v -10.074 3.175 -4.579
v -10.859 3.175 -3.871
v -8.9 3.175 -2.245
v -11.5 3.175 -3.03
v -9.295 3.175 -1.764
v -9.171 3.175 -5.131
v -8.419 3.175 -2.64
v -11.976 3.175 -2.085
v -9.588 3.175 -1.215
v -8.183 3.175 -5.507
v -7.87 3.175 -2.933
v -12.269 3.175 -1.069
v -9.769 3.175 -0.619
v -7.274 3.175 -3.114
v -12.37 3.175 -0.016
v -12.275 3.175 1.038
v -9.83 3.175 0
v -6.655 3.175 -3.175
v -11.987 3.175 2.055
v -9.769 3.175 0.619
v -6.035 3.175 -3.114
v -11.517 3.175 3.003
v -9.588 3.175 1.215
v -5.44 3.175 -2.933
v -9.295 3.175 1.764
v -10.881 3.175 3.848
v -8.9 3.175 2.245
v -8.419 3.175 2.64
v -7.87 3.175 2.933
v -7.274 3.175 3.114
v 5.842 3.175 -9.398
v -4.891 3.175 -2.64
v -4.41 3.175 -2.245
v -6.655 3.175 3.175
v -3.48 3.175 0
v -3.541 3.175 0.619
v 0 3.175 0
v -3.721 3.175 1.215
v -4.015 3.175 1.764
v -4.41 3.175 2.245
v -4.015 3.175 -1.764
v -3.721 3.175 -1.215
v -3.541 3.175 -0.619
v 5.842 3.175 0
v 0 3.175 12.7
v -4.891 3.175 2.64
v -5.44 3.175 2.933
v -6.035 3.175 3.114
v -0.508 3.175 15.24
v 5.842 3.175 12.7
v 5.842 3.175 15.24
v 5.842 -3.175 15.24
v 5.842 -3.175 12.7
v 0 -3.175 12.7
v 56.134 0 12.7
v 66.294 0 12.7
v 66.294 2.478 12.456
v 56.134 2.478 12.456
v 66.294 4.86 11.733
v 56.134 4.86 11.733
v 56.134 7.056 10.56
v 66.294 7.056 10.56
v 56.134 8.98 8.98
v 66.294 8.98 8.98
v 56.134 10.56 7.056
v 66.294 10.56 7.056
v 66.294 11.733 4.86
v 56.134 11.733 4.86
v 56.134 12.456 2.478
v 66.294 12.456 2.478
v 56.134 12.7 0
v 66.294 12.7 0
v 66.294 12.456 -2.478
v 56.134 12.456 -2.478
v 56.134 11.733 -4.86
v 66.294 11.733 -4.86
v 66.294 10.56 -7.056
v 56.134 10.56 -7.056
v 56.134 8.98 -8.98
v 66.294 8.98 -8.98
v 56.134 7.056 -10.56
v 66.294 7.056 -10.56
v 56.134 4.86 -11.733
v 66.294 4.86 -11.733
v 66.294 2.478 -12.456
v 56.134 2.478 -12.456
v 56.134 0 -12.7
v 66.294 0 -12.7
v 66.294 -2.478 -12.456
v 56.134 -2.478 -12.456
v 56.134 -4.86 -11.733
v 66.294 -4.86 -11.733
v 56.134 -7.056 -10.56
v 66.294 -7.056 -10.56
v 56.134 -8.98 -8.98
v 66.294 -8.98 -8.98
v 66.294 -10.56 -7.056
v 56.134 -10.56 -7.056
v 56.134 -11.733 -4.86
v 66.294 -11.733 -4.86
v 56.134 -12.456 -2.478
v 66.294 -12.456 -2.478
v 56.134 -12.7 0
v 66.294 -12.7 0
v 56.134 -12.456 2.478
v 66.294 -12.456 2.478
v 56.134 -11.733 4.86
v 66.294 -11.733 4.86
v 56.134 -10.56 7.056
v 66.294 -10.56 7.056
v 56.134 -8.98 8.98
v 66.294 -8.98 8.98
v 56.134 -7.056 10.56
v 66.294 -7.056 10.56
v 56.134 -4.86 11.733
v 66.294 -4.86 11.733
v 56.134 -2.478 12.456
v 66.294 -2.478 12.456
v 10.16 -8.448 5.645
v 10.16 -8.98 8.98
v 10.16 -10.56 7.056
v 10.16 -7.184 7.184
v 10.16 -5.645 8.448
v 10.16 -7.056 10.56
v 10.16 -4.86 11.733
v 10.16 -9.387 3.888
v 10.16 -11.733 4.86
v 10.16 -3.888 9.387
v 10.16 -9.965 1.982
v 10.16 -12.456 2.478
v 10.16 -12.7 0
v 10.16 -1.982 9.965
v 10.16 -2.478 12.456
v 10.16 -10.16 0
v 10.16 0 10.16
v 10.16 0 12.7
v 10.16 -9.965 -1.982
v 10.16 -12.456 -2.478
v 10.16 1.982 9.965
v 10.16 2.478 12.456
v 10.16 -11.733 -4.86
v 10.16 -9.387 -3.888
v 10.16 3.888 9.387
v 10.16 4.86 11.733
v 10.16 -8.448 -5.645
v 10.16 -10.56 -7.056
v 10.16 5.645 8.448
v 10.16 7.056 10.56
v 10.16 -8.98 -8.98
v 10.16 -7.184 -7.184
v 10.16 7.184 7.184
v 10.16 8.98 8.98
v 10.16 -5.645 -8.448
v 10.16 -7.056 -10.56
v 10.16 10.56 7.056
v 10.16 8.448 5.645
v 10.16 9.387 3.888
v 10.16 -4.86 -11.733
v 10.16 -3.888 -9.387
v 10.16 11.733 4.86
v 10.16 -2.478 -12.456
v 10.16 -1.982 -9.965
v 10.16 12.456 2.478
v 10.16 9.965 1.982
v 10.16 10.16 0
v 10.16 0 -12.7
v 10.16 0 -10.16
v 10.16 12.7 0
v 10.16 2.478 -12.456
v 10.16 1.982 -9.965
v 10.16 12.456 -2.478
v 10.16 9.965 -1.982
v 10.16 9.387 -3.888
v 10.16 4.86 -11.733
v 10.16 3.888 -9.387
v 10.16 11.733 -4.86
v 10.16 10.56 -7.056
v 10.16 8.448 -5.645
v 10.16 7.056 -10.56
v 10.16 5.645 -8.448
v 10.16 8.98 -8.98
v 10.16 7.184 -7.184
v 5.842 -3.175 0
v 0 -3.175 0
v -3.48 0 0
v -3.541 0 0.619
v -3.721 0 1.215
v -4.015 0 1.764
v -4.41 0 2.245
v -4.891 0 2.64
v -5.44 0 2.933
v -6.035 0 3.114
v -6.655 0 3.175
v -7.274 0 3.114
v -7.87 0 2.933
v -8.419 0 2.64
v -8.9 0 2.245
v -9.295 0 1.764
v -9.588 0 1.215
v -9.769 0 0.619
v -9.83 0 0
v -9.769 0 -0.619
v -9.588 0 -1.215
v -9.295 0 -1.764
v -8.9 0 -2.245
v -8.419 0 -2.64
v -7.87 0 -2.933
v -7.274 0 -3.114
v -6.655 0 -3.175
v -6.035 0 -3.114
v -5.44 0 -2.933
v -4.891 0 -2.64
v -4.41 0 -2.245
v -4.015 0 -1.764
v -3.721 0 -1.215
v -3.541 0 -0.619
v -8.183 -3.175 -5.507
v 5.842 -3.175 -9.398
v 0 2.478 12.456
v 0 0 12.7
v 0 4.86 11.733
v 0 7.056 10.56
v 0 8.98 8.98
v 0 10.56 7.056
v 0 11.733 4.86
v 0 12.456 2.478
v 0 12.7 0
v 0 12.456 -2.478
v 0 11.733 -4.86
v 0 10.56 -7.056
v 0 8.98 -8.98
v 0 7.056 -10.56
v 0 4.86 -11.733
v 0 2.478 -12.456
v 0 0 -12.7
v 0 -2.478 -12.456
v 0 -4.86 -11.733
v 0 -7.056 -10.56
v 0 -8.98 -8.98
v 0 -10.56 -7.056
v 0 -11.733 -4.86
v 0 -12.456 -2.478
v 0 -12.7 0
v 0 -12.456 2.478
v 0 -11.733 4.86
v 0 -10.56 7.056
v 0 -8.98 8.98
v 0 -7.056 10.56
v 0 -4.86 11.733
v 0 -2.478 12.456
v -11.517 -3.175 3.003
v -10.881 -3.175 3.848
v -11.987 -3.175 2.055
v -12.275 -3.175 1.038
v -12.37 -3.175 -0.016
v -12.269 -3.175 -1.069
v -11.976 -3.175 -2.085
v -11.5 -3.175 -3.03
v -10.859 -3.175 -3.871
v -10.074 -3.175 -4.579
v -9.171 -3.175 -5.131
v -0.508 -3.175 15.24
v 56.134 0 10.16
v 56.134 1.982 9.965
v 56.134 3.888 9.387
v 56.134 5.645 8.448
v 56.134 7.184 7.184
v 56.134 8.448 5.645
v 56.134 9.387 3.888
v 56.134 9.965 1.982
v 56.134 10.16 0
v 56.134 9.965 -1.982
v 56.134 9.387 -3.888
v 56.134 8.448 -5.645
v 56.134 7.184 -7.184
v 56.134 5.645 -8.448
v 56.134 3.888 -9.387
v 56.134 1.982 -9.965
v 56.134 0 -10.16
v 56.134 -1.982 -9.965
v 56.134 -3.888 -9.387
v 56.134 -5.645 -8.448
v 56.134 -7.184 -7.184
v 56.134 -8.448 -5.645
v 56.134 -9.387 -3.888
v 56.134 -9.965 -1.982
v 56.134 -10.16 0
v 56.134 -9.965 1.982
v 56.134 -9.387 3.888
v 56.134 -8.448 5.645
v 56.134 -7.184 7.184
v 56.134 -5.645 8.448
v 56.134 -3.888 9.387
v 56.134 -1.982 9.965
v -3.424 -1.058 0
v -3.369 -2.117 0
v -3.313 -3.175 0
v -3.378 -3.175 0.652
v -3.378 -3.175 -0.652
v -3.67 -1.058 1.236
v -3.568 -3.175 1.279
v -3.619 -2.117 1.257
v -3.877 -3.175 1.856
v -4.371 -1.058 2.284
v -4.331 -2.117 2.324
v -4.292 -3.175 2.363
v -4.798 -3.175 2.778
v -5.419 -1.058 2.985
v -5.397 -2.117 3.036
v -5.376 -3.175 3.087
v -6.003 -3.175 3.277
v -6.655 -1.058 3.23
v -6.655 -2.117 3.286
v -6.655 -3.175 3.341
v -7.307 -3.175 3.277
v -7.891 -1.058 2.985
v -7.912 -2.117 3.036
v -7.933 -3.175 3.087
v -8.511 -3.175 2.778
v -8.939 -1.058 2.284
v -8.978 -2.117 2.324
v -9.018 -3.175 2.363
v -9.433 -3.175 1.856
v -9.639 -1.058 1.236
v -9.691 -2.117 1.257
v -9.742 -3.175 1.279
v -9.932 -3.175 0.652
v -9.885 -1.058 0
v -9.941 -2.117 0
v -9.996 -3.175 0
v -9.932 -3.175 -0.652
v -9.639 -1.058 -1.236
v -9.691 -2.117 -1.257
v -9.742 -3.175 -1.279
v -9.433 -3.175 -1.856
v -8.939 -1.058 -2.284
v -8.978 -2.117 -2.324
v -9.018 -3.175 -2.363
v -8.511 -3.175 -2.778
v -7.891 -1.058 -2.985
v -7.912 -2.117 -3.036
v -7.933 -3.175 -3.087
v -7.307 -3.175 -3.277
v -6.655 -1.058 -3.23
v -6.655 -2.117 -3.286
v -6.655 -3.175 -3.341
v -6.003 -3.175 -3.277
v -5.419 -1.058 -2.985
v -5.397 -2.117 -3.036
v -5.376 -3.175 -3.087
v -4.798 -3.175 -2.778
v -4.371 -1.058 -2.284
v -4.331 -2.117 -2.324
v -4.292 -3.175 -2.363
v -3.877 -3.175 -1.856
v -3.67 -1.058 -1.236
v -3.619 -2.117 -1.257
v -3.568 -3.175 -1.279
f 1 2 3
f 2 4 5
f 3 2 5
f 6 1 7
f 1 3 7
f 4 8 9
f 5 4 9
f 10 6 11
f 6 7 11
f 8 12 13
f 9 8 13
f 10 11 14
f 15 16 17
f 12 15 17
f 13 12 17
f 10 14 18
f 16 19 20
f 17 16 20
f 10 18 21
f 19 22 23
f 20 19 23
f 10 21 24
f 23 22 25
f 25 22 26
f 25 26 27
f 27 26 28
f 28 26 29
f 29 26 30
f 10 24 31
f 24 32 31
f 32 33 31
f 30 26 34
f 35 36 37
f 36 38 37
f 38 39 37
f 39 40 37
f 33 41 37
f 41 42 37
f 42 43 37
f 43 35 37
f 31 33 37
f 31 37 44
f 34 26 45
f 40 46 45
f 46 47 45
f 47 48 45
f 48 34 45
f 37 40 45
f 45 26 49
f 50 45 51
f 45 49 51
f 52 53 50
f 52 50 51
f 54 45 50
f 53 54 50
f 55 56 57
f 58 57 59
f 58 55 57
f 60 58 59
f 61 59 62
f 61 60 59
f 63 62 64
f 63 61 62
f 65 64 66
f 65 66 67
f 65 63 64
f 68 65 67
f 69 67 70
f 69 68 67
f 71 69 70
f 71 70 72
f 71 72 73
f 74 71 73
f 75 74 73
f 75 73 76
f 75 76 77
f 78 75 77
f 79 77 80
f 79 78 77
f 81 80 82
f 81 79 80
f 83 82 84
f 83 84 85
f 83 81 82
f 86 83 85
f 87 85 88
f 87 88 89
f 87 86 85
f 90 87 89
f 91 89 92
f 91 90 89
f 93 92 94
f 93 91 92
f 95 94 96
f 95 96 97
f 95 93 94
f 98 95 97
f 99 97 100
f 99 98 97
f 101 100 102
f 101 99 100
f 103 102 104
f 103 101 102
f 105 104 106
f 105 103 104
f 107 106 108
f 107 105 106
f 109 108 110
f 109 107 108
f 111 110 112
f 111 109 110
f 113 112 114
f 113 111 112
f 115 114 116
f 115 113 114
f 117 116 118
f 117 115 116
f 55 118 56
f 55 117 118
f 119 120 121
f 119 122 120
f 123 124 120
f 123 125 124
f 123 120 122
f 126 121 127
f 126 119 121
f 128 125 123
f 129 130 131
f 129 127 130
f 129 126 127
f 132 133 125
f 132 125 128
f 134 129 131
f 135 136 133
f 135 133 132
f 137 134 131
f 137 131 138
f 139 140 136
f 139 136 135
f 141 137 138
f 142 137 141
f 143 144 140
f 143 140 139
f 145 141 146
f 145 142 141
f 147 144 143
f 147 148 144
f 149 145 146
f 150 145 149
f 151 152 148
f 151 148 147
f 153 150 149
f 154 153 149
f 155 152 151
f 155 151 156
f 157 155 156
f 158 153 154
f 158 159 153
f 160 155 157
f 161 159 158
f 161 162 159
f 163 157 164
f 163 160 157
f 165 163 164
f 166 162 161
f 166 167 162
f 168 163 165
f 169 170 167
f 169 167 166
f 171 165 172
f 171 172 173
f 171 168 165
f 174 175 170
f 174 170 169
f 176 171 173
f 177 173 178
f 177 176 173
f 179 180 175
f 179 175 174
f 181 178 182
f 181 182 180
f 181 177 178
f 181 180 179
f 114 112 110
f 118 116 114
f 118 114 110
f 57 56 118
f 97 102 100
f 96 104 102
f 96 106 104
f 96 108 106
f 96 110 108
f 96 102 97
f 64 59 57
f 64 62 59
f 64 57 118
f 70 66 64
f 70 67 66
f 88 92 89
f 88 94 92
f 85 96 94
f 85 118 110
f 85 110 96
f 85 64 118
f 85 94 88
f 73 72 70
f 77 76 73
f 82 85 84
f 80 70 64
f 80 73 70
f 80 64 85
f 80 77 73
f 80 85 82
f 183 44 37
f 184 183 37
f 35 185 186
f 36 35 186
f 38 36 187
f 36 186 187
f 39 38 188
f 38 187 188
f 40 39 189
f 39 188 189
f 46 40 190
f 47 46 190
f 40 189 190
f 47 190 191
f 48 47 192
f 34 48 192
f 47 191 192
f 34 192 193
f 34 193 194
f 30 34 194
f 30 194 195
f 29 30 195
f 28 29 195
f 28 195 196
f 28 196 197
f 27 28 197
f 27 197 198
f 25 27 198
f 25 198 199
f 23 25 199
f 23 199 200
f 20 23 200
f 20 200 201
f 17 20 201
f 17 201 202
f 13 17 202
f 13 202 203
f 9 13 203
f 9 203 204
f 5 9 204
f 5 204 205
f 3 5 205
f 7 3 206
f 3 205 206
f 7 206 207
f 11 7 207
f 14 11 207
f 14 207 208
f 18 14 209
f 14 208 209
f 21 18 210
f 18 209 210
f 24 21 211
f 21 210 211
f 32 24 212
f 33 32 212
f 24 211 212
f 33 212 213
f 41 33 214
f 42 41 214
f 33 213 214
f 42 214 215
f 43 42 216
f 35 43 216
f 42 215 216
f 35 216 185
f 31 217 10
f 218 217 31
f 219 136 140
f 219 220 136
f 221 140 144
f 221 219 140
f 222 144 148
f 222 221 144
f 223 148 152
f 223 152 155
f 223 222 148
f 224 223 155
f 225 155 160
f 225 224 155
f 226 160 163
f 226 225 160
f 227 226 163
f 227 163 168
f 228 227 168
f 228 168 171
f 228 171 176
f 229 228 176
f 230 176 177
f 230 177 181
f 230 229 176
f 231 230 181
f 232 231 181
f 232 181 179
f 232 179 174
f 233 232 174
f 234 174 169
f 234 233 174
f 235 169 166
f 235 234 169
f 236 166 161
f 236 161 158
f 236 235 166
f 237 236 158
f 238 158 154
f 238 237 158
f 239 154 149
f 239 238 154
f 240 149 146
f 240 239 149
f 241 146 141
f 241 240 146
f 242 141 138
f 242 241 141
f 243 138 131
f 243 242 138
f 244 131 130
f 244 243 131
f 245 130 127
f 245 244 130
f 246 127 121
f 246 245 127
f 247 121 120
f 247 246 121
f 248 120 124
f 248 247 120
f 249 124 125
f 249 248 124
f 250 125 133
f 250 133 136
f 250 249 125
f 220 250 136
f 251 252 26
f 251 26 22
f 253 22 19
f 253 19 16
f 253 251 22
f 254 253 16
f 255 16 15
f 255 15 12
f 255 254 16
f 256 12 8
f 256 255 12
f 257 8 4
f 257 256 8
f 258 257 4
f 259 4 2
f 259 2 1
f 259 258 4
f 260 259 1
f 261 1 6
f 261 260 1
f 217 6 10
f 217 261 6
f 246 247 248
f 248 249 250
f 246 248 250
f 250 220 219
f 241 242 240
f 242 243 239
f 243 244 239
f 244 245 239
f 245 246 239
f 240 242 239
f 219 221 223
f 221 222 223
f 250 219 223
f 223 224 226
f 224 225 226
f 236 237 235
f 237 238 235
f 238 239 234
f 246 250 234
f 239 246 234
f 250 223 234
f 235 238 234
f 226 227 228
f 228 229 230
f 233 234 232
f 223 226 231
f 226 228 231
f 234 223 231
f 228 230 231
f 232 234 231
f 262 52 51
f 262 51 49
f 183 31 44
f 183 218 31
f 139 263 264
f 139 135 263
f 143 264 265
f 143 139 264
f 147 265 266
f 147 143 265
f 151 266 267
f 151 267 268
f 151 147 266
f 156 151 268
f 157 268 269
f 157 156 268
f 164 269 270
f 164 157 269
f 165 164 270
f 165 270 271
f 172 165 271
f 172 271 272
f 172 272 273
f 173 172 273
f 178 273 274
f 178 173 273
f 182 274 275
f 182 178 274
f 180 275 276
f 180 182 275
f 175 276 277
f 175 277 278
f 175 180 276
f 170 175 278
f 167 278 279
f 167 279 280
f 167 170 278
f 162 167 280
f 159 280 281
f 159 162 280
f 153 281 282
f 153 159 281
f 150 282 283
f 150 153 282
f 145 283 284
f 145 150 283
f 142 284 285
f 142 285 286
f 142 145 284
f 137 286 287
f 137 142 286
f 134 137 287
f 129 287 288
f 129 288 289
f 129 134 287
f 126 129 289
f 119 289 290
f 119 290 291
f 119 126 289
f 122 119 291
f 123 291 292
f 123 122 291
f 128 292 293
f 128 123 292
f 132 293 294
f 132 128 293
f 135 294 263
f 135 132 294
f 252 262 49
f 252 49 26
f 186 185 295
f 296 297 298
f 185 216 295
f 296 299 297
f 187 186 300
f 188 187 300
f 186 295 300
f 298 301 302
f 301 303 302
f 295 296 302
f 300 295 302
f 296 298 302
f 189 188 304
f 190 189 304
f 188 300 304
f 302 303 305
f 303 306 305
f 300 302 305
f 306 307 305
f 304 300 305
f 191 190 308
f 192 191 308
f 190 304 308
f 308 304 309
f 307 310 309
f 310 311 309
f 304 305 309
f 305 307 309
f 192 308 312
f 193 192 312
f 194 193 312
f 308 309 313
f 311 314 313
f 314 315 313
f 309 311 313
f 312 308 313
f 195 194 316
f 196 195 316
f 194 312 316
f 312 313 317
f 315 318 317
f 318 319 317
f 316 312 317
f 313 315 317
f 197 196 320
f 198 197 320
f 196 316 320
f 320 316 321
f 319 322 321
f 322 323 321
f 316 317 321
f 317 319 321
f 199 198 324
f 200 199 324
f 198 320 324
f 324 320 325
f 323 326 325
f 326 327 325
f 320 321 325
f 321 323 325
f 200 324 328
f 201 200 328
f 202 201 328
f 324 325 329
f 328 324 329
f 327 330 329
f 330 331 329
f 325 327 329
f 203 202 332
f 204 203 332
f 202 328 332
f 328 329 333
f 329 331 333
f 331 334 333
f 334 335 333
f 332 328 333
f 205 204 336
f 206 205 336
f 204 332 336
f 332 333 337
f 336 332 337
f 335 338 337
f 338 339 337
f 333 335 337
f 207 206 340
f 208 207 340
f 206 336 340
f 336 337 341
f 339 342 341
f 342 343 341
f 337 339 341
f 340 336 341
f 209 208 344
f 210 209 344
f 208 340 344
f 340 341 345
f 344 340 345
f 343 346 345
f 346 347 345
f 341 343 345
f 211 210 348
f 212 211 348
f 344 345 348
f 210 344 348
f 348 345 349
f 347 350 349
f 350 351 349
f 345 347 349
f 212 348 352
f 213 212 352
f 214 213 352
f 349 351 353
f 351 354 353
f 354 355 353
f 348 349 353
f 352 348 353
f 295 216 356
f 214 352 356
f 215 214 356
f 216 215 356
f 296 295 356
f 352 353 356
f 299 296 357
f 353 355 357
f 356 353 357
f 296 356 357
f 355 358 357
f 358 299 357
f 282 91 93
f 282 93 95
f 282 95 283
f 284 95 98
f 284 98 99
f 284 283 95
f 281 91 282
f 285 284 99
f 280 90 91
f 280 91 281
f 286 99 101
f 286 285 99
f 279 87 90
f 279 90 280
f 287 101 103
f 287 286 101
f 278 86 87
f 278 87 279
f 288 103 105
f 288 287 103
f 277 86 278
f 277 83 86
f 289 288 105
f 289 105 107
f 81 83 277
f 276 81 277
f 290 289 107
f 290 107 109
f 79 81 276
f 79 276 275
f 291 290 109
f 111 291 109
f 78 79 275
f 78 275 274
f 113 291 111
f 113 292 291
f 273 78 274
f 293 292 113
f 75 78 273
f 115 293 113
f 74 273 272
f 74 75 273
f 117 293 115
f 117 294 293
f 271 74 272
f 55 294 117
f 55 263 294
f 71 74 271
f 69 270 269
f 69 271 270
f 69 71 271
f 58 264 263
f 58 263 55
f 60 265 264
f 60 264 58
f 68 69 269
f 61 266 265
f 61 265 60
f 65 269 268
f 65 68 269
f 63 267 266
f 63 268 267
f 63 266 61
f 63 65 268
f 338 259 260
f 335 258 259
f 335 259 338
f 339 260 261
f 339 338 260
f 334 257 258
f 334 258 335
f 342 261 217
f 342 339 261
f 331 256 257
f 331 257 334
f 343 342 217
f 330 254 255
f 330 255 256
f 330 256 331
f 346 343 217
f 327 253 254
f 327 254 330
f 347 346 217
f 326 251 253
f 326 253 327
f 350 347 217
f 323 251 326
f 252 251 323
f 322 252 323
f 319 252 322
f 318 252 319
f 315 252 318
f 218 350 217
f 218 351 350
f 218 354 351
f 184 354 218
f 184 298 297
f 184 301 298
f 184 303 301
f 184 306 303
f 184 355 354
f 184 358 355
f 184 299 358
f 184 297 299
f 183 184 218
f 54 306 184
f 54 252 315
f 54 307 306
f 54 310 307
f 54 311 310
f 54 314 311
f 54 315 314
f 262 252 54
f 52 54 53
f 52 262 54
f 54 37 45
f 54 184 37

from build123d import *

# Parameters (mm, degrees)
F0_R          = 3.175
F1_DEPTH      = 3.175
F1_DEPTH_BACK = 3.175
F2_DEPTH      = 3.176
F2_TAPER      = -3
F2_DEPTH_BACK = 3.176
F0_W          = 5.842
F0_H          = 12.7


with BuildPart() as f1:
    # F0 (on Front) → F1 (new body, two sides)
    with BuildSketch(Plane.XZ) as f1_sk:
        with BuildLine():
            Line((-0.9398, 0), (0, 0))
            Line((0, 0), (0, 12.7))
            Line((0, 12.7), (5.842, 12.7))
            Line((5.842, 12.7), (5.842, 15.24))
            Line((5.842, 15.24), (-0.508, 15.24))
            Line((-0.508, 15.24), (-10.8806298187, 3.8475430269))
            ThreePointArc((-10.8806298187, 3.8475430269), (-4.5919612295, 5.3297205562), (-0.9398, 0))
        make_face()
        with BuildLine():
            Line((5.842, 0), (0, 0))
            Line((0, 0), (-0.9398, 0))
            ThreePointArc((-0.9398, 0), (-3.1957909266, -4.5493385486), (-8.1826630726, -5.5069827884))
            Line((-8.1826630726, -5.5069827884), (5.842, -9.398))
            Line((5.842, -9.398), (5.842, 0))
        make_face()
        with BuildLine():
            ThreePointArc((-8.1826630726, -5.5069827884), (-3.1957909266, -4.5493385486), (-0.9398, 0))
            ThreePointArc((-0.9398, 0), (-4.5919612295, 5.3297205562), (-10.8806298187, 3.8475430269))
            ThreePointArc((-10.8806298187, 3.8475430269), (-12.1459778134, -1.5837270034), (-8.1826630726, -5.5069827884))
        make_face()
        with Locations((-6.6548, 0)):
            Circle(F0_R, mode=Mode.SUBTRACT)
        with Locations((-6.6548, 0)):
            Circle(F0_R)
    extrude(amount=F1_DEPTH)
    extrude(f1_sk.sketch, amount=-F1_DEPTH_BACK)

    # F0 (on Front) → F2 (cut, two sides)
    with BuildSketch(Plane.XZ) as f2_sk:
        with Locations((-6.6548, 0)):
            Circle(F0_R)
    extrude(amount=F2_DEPTH, taper=F2_TAPER, mode=Mode.SUBTRACT)
    extrude(f2_sk.sketch, amount=-F2_DEPTH_BACK, mode=Mode.SUBTRACT)


with BuildPart() as f3:
    # F0 (on Front) → F3 (revolve)
    with BuildSketch(Plane.XZ):
        with Locations((2.921, 6.35)):
            Rectangle(F0_W, F0_H)
        Polygon((5.842, 12.7), (5.842, 0), (66.294, 0), (66.294, 12.7), (56.134, 12.7), (56.134, 10.16), (10.16, 10.16), (10.16, 12.7), align=None)
    revolve(axis=Axis((33.147, 0, 0), (-1, 0, 0)))


solid = Compound([f1.part, f3.part])
